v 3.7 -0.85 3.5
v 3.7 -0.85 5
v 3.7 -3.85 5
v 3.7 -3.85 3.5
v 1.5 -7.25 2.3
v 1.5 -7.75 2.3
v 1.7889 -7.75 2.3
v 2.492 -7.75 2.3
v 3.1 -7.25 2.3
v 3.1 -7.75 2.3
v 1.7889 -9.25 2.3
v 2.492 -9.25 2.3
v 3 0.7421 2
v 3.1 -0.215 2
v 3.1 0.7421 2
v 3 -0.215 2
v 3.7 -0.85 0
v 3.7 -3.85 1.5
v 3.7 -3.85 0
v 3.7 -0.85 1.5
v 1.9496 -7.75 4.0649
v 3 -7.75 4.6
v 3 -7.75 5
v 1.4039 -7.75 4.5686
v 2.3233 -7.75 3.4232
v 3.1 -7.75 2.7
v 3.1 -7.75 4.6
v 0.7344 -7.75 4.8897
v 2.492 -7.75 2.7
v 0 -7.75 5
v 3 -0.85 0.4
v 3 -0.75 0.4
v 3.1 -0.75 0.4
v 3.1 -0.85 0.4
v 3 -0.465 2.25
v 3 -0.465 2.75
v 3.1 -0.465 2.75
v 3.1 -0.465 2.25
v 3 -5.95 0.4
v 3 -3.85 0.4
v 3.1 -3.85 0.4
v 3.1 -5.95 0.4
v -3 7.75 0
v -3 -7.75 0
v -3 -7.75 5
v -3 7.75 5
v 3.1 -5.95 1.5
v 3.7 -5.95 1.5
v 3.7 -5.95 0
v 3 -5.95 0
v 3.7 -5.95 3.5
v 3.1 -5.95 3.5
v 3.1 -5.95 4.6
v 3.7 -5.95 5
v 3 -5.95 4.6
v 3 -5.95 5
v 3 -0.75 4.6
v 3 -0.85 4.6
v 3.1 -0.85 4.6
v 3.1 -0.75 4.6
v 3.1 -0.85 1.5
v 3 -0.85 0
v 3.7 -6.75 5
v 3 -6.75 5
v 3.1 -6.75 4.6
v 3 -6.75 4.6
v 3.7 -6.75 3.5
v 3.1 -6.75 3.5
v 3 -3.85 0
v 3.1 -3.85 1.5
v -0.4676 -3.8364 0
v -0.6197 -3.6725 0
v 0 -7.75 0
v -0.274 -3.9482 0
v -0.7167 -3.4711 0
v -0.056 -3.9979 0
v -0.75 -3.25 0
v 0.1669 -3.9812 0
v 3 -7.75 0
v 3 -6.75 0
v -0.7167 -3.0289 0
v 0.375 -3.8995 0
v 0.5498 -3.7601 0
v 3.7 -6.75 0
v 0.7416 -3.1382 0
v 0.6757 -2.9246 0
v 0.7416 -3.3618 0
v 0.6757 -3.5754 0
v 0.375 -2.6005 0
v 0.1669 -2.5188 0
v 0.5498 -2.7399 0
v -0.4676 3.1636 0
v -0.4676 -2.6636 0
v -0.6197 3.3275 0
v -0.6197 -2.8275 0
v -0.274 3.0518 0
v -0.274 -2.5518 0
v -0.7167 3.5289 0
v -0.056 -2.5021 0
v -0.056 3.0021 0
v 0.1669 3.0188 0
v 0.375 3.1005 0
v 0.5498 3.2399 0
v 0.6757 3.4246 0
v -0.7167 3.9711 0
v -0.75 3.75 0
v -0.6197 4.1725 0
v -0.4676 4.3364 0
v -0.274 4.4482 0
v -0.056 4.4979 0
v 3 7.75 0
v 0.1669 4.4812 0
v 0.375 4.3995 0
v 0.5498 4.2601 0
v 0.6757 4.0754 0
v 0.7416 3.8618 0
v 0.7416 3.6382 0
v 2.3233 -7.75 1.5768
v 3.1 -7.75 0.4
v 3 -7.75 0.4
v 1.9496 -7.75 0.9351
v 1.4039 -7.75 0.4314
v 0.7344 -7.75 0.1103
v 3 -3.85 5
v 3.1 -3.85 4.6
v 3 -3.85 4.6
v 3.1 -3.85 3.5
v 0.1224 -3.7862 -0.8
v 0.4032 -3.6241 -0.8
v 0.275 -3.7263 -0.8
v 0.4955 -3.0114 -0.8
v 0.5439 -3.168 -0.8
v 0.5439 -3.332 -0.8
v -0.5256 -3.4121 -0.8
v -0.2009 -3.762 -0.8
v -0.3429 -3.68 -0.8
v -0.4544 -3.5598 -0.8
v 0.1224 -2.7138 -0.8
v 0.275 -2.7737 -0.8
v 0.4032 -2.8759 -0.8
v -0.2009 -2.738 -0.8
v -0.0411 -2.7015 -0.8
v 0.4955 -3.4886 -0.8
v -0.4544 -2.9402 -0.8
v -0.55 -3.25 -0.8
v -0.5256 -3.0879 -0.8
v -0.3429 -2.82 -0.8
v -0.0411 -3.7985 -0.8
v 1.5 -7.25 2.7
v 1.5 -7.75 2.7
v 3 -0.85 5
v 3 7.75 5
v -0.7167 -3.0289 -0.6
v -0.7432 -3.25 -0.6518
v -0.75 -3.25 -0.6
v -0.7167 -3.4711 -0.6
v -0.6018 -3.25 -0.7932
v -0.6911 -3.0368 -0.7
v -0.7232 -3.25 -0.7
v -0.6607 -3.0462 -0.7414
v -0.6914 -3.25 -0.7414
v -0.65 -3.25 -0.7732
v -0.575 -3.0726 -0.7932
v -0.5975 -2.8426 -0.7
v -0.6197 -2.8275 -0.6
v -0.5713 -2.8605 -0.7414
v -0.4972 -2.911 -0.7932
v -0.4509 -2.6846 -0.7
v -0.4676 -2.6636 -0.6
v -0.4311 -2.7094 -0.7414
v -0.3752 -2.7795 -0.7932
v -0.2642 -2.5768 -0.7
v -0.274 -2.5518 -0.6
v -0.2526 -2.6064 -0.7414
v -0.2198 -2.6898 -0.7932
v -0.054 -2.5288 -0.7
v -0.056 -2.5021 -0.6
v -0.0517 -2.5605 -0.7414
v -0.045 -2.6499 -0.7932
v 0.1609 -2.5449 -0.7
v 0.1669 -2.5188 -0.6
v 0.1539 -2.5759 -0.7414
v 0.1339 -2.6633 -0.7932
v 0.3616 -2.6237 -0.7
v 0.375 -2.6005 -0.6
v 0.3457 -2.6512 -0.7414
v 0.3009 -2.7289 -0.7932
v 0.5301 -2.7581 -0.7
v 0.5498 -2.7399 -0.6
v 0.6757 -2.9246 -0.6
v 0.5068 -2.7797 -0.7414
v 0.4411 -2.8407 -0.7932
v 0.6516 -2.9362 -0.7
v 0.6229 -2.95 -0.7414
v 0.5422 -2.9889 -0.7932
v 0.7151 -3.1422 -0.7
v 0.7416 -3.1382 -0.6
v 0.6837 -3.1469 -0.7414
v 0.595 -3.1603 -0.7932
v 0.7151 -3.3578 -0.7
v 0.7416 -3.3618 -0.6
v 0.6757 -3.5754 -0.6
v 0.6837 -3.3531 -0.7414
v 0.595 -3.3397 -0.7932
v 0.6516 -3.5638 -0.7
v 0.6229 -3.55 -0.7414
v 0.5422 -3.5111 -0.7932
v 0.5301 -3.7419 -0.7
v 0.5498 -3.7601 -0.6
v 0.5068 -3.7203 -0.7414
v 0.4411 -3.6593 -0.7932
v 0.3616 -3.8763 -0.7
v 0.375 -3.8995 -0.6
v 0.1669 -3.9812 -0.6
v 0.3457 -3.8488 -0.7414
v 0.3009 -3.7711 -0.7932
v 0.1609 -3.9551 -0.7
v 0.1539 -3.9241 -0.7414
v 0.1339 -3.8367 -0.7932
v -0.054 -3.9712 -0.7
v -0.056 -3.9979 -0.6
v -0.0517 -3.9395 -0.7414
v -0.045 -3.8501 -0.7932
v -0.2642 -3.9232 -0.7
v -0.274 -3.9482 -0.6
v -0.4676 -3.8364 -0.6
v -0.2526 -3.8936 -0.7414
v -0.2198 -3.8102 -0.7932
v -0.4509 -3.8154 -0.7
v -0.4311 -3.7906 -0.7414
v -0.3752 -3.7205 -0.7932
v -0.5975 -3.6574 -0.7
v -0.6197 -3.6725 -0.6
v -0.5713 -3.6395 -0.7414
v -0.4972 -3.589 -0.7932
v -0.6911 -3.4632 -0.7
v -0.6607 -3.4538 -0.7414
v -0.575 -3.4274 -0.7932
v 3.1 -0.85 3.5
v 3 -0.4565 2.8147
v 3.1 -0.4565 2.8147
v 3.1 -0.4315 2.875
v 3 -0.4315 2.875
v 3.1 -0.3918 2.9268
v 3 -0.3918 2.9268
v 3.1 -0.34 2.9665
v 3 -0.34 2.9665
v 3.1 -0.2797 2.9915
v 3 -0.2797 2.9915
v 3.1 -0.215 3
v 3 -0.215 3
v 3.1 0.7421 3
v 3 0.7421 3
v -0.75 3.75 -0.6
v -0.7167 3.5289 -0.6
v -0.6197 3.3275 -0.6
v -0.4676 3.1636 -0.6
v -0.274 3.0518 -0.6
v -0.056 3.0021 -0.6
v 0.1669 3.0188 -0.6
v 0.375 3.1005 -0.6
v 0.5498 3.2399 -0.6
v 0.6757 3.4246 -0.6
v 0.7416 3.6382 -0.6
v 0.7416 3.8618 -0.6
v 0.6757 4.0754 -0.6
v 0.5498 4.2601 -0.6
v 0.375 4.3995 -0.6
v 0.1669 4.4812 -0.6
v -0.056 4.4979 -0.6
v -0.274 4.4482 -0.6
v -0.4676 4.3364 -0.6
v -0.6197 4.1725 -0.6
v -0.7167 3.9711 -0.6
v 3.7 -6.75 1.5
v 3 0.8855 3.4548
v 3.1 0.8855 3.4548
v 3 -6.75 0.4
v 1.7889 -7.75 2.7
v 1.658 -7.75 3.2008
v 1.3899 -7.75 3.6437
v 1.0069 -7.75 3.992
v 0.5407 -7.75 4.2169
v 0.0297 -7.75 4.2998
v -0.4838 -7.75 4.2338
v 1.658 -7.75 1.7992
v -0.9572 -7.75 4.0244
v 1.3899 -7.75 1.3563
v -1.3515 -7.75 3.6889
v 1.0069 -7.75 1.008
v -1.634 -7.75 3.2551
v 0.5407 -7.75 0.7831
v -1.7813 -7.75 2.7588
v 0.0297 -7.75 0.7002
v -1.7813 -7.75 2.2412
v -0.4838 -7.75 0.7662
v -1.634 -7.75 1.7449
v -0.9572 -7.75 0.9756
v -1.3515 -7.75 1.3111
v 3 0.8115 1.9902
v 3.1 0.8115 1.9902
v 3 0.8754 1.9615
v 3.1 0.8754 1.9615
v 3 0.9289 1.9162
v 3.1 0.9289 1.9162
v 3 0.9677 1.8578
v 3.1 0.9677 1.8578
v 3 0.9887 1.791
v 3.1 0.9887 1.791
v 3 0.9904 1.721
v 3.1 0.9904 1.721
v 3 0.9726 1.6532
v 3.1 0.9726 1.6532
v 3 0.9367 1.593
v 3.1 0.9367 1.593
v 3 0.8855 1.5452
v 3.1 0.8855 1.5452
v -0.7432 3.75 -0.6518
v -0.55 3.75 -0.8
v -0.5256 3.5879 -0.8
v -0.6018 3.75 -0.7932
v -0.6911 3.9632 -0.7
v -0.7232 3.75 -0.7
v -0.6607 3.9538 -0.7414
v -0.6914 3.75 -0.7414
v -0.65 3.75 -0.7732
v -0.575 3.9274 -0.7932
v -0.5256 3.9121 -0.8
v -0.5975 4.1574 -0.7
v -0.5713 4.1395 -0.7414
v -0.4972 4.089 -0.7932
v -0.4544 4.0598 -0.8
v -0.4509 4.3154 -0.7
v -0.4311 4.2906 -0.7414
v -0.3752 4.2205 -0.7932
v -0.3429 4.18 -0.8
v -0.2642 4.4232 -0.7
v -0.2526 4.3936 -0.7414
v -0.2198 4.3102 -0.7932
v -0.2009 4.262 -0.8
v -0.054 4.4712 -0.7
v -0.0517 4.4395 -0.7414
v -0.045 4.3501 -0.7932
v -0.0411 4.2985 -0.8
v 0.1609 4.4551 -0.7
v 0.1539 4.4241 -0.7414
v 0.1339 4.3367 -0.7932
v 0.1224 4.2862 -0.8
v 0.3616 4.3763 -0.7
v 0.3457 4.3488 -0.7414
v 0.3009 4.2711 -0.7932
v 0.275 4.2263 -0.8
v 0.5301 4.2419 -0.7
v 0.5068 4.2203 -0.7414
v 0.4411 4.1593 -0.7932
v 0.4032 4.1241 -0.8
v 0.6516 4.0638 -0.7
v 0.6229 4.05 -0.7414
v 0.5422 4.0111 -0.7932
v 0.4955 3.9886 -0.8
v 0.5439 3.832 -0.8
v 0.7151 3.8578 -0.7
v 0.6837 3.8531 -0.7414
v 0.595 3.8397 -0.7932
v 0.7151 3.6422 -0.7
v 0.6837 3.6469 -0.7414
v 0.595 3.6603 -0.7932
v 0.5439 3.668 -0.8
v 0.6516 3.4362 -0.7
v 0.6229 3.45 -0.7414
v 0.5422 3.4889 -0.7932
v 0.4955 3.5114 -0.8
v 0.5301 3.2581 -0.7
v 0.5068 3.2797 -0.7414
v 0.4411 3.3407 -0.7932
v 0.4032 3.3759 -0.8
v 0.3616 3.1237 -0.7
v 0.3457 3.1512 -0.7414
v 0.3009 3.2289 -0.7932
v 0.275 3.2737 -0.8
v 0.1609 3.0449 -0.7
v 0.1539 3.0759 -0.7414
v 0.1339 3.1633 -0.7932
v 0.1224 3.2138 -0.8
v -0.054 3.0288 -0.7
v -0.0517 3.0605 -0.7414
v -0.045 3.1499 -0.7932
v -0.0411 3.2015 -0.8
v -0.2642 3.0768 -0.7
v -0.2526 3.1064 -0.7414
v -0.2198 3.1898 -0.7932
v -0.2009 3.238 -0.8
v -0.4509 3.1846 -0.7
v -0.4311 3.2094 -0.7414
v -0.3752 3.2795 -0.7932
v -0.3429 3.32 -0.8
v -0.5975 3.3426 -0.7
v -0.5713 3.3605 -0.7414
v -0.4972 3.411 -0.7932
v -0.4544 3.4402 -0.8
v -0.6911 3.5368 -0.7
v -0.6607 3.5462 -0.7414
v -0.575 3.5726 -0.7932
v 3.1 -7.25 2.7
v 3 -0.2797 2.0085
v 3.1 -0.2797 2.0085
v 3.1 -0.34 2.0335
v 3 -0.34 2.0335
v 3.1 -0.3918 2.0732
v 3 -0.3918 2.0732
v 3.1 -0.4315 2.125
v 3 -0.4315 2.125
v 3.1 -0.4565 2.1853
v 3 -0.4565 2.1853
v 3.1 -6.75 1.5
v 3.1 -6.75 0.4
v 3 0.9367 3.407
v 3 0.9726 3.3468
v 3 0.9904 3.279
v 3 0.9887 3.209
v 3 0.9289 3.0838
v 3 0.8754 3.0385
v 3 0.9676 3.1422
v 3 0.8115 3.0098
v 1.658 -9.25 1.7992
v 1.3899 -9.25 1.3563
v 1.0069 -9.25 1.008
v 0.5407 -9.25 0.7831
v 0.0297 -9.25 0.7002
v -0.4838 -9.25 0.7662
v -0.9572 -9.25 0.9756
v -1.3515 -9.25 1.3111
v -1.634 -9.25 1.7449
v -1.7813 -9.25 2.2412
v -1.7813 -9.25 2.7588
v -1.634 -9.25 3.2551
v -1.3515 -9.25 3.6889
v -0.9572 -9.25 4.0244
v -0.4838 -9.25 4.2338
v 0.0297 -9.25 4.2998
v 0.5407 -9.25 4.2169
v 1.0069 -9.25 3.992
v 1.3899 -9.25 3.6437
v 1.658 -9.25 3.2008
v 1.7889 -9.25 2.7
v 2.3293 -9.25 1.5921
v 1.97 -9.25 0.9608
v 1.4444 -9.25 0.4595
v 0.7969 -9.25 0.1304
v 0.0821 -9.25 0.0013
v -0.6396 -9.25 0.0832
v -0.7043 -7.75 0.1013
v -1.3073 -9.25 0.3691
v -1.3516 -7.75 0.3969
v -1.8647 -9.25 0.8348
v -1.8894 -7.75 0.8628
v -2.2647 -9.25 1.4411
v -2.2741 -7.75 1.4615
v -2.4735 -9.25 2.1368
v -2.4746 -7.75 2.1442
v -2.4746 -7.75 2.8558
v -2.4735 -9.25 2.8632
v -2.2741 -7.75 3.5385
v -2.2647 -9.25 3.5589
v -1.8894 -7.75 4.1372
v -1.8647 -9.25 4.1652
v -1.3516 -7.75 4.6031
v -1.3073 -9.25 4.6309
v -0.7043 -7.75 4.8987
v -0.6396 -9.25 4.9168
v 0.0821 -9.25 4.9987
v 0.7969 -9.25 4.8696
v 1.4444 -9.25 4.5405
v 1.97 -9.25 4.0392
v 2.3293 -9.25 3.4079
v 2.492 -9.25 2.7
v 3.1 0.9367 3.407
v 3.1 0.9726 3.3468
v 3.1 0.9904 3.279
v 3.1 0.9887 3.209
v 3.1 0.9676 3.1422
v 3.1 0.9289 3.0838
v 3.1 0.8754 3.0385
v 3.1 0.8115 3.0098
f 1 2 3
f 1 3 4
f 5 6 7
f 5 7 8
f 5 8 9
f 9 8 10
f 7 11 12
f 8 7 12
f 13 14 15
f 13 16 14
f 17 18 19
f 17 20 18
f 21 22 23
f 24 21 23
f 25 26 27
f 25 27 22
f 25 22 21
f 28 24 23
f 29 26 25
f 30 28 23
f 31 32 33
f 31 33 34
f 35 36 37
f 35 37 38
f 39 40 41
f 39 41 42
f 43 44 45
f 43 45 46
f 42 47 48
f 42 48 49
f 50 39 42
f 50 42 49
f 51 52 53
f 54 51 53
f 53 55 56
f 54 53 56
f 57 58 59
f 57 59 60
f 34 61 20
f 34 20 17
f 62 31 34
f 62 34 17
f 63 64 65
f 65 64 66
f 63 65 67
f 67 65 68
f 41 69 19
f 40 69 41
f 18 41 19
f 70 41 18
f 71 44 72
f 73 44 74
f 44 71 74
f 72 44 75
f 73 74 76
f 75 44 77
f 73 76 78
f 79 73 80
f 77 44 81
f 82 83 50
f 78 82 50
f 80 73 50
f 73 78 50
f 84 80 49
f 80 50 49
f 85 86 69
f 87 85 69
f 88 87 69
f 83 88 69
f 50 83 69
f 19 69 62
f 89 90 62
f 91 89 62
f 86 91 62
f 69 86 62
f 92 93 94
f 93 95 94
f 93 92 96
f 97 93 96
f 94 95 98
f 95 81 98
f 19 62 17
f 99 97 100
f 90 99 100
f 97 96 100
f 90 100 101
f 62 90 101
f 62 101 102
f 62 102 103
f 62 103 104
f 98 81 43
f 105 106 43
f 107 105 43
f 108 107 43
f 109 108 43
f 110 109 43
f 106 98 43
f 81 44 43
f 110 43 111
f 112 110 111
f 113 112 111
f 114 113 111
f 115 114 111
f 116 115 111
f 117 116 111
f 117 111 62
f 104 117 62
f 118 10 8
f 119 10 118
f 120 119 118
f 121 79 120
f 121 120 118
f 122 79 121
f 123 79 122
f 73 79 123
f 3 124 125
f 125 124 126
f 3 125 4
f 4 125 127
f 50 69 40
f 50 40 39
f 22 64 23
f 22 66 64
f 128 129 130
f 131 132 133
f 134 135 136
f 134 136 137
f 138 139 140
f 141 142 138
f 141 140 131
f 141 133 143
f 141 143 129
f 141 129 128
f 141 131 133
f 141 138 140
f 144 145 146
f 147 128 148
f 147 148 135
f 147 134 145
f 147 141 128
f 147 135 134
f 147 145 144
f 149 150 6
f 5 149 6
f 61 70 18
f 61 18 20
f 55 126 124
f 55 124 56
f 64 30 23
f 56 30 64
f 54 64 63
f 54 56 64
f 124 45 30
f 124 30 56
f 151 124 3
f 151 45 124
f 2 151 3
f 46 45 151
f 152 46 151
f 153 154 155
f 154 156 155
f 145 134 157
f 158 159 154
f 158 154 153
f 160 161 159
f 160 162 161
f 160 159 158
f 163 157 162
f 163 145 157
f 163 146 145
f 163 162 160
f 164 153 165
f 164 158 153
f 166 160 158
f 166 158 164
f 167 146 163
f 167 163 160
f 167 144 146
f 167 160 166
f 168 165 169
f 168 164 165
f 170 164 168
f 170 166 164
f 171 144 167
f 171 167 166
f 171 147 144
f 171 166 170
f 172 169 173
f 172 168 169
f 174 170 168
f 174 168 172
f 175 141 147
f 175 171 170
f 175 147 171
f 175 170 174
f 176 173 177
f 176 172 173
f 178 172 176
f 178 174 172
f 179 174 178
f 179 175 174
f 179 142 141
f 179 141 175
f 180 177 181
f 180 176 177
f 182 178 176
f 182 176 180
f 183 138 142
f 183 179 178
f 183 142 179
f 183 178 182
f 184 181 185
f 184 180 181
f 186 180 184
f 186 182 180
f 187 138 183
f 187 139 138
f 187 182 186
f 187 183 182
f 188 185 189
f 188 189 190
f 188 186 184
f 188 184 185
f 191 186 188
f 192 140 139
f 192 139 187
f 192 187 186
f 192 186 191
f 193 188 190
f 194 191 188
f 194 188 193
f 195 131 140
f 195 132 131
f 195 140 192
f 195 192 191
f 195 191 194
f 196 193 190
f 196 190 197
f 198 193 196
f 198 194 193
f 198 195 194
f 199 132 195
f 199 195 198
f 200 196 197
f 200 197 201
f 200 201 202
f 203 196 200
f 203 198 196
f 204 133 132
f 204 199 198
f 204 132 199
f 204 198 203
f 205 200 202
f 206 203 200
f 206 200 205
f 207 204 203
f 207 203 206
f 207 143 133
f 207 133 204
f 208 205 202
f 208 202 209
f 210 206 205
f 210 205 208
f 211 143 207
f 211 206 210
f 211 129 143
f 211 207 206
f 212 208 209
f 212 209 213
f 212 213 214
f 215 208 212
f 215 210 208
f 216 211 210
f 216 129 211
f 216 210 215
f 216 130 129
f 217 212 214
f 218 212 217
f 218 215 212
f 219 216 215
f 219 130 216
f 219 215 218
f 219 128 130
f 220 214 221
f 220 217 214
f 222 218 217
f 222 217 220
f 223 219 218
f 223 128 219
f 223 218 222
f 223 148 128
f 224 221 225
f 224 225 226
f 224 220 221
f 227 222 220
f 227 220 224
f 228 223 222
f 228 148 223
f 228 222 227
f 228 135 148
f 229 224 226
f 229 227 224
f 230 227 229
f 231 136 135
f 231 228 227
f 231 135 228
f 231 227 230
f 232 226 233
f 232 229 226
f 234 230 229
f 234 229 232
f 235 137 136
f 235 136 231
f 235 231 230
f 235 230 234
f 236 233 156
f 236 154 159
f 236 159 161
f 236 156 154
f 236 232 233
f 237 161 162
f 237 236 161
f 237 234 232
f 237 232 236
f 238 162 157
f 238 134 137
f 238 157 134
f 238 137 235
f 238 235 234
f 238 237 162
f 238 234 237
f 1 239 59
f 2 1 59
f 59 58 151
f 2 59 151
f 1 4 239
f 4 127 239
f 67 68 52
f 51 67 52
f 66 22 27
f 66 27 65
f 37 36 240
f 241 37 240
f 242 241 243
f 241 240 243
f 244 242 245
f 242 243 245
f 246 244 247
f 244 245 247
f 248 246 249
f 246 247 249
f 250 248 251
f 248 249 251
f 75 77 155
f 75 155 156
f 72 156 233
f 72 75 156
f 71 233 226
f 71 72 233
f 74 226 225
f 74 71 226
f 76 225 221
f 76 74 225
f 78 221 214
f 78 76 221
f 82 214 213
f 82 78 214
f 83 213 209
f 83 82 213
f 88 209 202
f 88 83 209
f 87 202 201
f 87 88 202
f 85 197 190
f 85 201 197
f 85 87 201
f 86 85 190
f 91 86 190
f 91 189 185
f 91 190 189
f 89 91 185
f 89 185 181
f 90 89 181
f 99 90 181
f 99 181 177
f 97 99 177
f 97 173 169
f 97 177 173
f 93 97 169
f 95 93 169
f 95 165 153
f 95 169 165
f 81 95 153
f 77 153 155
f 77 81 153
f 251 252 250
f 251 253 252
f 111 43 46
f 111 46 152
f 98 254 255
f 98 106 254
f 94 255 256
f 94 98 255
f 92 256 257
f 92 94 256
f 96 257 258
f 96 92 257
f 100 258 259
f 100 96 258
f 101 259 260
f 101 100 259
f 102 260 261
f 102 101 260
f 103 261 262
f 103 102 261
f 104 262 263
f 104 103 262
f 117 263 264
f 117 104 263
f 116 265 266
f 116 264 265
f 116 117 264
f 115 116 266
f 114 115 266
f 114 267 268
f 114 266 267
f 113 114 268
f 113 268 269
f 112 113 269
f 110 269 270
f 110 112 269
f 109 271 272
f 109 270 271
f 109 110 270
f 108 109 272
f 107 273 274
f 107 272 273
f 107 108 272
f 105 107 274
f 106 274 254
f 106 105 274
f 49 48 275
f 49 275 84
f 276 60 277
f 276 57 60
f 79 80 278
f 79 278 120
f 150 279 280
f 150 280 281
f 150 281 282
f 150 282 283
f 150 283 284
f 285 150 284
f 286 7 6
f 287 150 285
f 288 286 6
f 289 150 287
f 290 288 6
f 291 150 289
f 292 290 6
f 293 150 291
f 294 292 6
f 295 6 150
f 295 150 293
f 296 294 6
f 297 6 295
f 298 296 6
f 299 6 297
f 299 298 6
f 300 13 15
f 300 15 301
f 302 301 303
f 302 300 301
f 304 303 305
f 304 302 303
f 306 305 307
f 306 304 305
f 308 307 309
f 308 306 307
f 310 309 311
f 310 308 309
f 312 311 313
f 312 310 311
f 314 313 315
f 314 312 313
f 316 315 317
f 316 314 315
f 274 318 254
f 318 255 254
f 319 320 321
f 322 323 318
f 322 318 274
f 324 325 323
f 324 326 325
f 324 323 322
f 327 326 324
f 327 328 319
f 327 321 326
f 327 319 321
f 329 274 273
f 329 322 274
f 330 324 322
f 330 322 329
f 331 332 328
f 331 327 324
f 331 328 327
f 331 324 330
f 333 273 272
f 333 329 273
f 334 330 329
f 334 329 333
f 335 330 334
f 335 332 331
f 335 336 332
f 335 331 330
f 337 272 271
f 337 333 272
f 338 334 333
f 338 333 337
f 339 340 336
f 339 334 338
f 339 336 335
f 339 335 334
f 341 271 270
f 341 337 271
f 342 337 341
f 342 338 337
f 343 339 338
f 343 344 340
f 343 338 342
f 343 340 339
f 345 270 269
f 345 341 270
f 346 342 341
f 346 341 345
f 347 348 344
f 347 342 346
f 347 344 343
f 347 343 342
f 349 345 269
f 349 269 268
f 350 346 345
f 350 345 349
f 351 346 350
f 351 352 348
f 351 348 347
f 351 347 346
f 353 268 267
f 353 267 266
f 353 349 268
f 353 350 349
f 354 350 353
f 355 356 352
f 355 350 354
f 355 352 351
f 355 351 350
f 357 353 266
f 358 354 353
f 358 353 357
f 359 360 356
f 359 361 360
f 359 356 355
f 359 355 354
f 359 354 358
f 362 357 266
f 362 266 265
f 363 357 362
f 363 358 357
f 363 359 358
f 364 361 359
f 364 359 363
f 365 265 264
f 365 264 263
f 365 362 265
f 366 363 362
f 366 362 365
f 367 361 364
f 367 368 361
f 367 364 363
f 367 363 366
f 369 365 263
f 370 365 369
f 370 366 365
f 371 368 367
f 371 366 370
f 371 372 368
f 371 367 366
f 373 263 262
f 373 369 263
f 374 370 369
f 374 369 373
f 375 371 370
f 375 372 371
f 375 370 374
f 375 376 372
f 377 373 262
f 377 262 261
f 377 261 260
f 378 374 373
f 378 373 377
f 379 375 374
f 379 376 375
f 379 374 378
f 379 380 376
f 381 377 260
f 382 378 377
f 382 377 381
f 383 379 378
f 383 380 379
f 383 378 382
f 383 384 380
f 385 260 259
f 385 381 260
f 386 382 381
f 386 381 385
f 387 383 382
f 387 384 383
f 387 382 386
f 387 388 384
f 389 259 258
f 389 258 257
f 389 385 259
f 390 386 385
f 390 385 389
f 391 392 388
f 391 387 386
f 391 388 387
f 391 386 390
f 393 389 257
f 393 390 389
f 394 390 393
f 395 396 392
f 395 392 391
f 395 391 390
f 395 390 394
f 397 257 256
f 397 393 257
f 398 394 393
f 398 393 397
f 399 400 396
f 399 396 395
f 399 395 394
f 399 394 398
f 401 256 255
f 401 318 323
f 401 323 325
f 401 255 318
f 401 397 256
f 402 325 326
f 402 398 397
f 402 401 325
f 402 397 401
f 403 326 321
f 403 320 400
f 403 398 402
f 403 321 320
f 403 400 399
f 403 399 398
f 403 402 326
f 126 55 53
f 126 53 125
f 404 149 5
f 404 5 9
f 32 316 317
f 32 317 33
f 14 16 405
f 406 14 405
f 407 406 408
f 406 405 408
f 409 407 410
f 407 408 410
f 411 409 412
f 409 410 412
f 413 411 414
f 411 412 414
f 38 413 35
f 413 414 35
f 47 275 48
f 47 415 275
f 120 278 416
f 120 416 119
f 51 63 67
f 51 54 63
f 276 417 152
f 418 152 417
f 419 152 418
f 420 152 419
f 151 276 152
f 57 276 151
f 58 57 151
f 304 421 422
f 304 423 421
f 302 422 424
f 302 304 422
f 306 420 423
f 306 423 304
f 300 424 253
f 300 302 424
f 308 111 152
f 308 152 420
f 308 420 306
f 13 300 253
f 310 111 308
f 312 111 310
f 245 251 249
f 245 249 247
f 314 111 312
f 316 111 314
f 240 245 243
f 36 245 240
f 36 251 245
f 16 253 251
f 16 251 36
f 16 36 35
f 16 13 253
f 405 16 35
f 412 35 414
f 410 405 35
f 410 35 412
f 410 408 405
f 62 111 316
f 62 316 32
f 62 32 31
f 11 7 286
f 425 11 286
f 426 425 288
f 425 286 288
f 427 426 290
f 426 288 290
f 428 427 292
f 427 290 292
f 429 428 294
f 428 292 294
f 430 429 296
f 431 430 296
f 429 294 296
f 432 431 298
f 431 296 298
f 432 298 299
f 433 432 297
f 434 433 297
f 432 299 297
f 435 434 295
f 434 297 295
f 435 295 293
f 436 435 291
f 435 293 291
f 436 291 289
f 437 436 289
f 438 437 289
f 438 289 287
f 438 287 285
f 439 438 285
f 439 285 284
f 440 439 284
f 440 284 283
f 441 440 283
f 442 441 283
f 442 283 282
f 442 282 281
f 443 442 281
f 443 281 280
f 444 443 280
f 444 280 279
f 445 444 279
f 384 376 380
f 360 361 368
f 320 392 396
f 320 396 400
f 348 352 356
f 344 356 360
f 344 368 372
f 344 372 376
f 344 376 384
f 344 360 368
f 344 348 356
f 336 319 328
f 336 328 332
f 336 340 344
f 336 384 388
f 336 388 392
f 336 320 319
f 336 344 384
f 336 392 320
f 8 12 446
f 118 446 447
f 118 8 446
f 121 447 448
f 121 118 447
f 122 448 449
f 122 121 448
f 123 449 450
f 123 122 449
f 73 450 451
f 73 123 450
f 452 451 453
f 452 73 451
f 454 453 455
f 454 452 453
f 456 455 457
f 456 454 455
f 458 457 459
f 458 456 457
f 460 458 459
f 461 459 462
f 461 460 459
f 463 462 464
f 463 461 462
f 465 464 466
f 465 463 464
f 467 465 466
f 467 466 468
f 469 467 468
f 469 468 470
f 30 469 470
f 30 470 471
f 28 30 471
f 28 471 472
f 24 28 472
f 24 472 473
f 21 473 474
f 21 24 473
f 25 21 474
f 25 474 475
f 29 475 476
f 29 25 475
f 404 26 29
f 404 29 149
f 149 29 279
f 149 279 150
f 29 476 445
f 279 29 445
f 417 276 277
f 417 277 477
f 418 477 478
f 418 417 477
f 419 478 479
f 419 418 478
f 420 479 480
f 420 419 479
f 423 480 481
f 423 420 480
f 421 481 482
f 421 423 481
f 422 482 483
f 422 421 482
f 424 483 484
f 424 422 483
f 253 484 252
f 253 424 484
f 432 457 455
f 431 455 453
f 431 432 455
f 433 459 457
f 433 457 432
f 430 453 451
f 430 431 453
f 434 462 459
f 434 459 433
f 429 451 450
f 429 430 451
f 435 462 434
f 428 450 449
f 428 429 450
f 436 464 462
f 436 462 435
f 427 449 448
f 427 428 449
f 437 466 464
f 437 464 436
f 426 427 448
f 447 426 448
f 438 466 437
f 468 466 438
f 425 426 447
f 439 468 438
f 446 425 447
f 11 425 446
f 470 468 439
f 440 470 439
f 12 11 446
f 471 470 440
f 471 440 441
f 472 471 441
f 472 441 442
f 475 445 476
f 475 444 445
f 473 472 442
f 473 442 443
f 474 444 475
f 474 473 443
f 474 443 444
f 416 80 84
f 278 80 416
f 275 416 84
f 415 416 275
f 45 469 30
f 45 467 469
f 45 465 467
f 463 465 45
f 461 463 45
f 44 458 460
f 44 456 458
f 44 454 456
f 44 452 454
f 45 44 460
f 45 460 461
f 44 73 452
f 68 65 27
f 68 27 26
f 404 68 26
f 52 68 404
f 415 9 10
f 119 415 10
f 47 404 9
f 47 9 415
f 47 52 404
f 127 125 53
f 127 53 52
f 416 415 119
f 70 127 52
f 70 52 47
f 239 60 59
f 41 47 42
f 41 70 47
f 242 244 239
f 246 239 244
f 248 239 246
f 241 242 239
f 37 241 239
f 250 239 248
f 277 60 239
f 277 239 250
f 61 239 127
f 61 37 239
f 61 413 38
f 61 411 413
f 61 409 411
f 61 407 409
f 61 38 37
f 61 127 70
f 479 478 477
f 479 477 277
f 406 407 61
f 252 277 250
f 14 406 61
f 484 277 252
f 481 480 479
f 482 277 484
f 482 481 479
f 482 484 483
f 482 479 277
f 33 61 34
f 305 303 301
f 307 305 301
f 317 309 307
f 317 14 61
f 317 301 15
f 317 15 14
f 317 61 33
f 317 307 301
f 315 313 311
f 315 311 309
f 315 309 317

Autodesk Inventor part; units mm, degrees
ref_plane "YZ Plane" through (0, 0, 0) normal (1, 0, 0) x (0, 1, 0)
ref_plane "XZ Plane" through (0, 0, 0) normal (0, 1, 0) x (-1, 0, 0)
ref_plane "XY Plane" through (0, 0, 0) normal (0, 0, 1) x (1, 0, 0)
sketch "Sketch1" plane through (0, 0, 0) normal (0, 0, 1) x (1, 0, 0)
  line L0 (3, -7.75) -> (-3, -7.75)
  line L1 (-3, -7.75) -> (-3, 7.75)
  line L2 (-3, 7.75) -> (3, 7.75)
  line L3 (3, 7.75) -> (3, -7.75)
  line L4 (3, -7.75) -> (-3, 7.75) construction
  line L5 (-3, -7.75) -> (3, 7.75) construction
  point P0 (0, 0)
  dimension "d0" = 6
  dimension "d1" = 15.5
extrude "Extrusion1" add sketch "Sketch1" along normal blind 5
sketch "Sketch2" plane through (-3, -7.75, 0) normal (0, -1, 0) x (1, 0, 0)
  line L0 (6, 0) -> (0, 0) projected
  line L1 (6, 0) -> (6, 5) projected
  line L2 (0, 5) -> (6, 5) projected
  line L3 (0, 0) -> (0, 5) projected
  line L4 (6, 0) -> (0, 0) projected
  line L5 (0, 0) -> (6, 5)
  circle A0 centre (3, 2.5) radius 2.5
  circle A1 centre (3, 2.5) radius 1.8
  point P0 (3, 0)
  dimension "d4" = 5
  dimension "d5" = 3.6
extrude "Extrusion2" add sketch "Sketch2" along normal blind 1.5 contours A0 L5 A1 | A0 L5 A1
sketch "Sketch3" plane through (0, 0, 0) normal (0, 0, -1) x (-1, 0, 0)
  line L0 (-3, -7.75) -> (0, -7.75) projected
  line L1 (0, -7.75) -> (3, -7.75) projected
  line L2 (3, -7.75) -> (3, 7.75) projected
  line L3 (3, 7.75) -> (-3, 7.75) projected
  line L4 (-3, 7.75) -> (-3, -7.75) projected
  circle A0 centre (0, -3.25) radius 0.75
  circle A1 centre (0, 3.75) radius 0.75
  point P0 (0, 0)
  dimension "d8" = 1.5
  dimension "d9" = 1.5
  dimension "d10" = 4.5
  dimension "d11" = 7
extrude "Extrusion3" add sketch "Sketch3" along normal blind 0.8 contours A0 | A1
fillet "Fillet1" radius 0.2 2 edges at (0.75, -3.25, -0.8) (0.75, 3.75, -0.8)
sketch "Sketch4" plane through (3, -7.75, 0) normal (1, 0, 0) x (0, 0, -1)
  line L0 (0, 15.5) -> (0, 0) projected
  line L1 (0, 15.5) -> (-5, 15.5) projected
  line L2 (-5, 0) -> (-5, 15.5) projected
  line L3 (0, 0) -> (-5, 0) projected
  line L4 (-5, 15.5) -> (-5, 0) projected
  line L5 (-5, 1) -> (-3.5, 1)
  line L6 (-3.5, 1) -> (-3.5, 1.8)
  line L7 (-3.5, 1.8) -> (-5, 1.8)
  line L8 (-5, 1.8) -> (-5, 1)
  line L9 (0, 1) -> (-1.5, 1)
  line L10 (-1.5, 1) -> (-1.5, 1.8)
  line L11 (-1.5, 1.8) -> (0, 1.8)
  line L12 (0, 1.8) -> (0, 1)
  line L13 (-5, 3.9) -> (-3.5, 3.9)
  line L14 (-3.5, 3.9) -> (-3.5, 6.9)
  line L15 (-3.5, 6.9) -> (-5, 6.9)
  line L16 (-5, 6.9) -> (-5, 3.9)
  line L17 (0, 3.9) -> (-1.5, 3.9)
  line L18 (-1.5, 3.9) -> (-1.5, 6.9)
  line L19 (-1.5, 6.9) -> (0, 6.9)
  line L20 (0, 6.9) -> (0, 3.9)
  point P0 (0, 7.75)
  dimension "d15" = 1
  dimension "d16" = 0.8
  dimension "d17" = 1.5
  dimension "d18" = 1.5
  dimension "d19" = 1.5
  dimension "d20" = 1.5
  dimension "d21" = 3.9
  dimension "d22" = 3
extrude "Extrusion4" add sketch "Sketch4" along normal blind 0.7 contours L0 L17 L18 L19 | L15 L14 L13 L2 | L0 L9 L10 L11 | L7 L6 L5 L2
sketch "Sketch5" plane through (3, 7.75, 5) normal (1, 0, 0) x (0, 0, -1)
  line L0 (3.5, -8.6) -> (5, -8.6) projected
  line L1 (5, 0) -> (5, -8.6) projected
  line L2 (5, 0) -> (0, 0) projected
  line L3 (0, -8.6) -> (0, 0) projected
  line L4 (0, -8.6) -> (1.5, -8.6) projected
  line L5 (1.5, -8.6) -> (1.5, -11.6) projected
  line L6 (1.5, -11.6) -> (0, -11.6) projected
  line L7 (0, -13.7) -> (0, -11.6) projected
  line L8 (0, -13.7) -> (1.5, -13.7) projected
  line L9 (1.5, -13.7) -> (1.5, -14.5) projected
  line L10 (1.5, -14.5) -> (0, -14.5) projected
  line L11 (0, -15.5) -> (0, -14.5) projected
  line L12 (5, -15.5) -> (0, -15.5) projected
  line L13 (5, -14.5) -> (5, -15.5) projected
  line L14 (5, -14.5) -> (3.5, -14.5) projected
  line L15 (3.5, -14.5) -> (3.5, -13.7) projected
  line L16 (3.5, -13.7) -> (5, -13.7) projected
  line L17 (5, -11.6) -> (5, -13.7) projected
  line L18 (5, -11.6) -> (3.5, -11.6) projected
  line L19 (3.5, -11.6) -> (3.5, -8.6) projected
  line L20 (0.4, -15.5) -> (0.4, -8.5)
  line L21 (0, -8.6) -> (1.5, -8.6) projected
  line L22 (0.4, -8.5) -> (1.5452, -6.8645)
  line L23 (2, -7.0079) -> (2, -7.965)
  line L24 (2.25, -8.215) -> (2.75, -8.215)
  line L25 (3, -7.965) -> (3, -7.0079)
  line L26 (3.4548, -6.8645) -> (4.6, -8.5)
  line L27 (4.6, -8.5) -> (4.6, -15.5)
  line L28 (5, -15.5) -> (0, -15.5) projected
  line L29 (2.5, -15.5) -> (2.5, 0)
  line L30 (5, 0) -> (0, 0) projected
  arc A0 (3.4548, -6.8645) -> (3, -7.0079) centre (3.25, -7.0079) ccw
  arc A1 (2, -7.0079) -> (1.5452, -6.8645) centre (1.75, -7.0079) ccw
  arc A2 (2, -7.965) -> (2.25, -8.215) centre (2.25, -7.965) ccw
  arc A3 (2.75, -8.215) -> (3, -7.965) centre (2.75, -7.965) ccw
  point P0 (5, -7.75)
  point P1 (2, -8.215)
  point P2 (3, -8.215)
  point P3 (3, -6.215)
  point P4 (2.5, -8.215)
  dimension "d25" = 0.4
  dimension "d26" = 0.4
  dimension "d27" = 145
  dimension "d28" = 145
  dimension "d29" = 1
  dimension "d30" = 7
  dimension "d31" = 7
  dimension "d32" = 2
  dimension "d33" = 0.25
extrude "Extrusion5" add sketch "Sketch5" along normal blind 0.1 contours L19 L18 L27 L16 L15 L14 L12 L29 L24 A3 L25 A0 L26 L0 | L0 L27 L18 L19 | L27 L14 L15 L16 | L29 L12 L20 L10 L9 L8 L6 L5 L4 L22 A1 L23 A2 L24 | L4 L5 L6 L20 | L20 L8 L9 L10
sketch "Sketch6" plane through (0, -9.25, 2.5) normal (0, -1, 0) x (1, 0, 0)
  circle A0 centre (0, 0) radius 1.8 projected
  circle A1 centre (0, 0) radius 2.5 projected
  line L0 (1.5, -0.2) -> (3.5, -0.2)
  line L1 (3.5, -0.2) -> (3.5, 0.2)
  line L2 (3.5, 0.2) -> (1.5, 0.2)
  line L3 (1.5, 0.2) -> (1.5, -0.2)
  line L4 (1.5, -0.2) -> (3.5, 0.2) construction
  line L5 (3.5, -0.2) -> (1.5, 0.2) construction
  point P0 (0, -2.5)
  point P1 (2.5, 0)
  dimension "d36" = 2
  dimension "d37" = 0.4
extrude "Extrusion6" cut sketch "Sketch6" against normal blind 2 contours A0 L0 L3 L2 | A0 L2 A1 L0 | L2 L1 L0 A1 picked at (1.6, 0) picked at (2.0301, 0.1112)
equation "\"d18\" = d17"
equation "\"d19\" = d17"
equation "\"d20\" = d18"
equation "\"d26\" = d25"
equation "\"d31\" = d30"
properties part number "SJ-4351X-SMT" material "ABS Plastic"
